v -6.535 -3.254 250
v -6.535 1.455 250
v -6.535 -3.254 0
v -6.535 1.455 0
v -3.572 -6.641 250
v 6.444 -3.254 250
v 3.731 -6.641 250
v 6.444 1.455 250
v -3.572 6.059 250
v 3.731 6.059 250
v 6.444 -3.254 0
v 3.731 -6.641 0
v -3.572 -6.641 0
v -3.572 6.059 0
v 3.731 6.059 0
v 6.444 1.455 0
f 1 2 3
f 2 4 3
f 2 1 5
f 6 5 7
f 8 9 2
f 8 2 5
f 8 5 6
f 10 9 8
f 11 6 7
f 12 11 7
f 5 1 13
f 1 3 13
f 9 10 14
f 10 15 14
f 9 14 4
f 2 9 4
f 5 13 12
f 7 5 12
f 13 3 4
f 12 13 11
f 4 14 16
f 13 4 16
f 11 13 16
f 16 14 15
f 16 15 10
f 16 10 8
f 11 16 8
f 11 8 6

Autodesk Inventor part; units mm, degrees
ref_plane "YZ Plane" through (0, 0, 0) normal (1, 0, 0) x (0, 1, 0)
ref_plane "XZ Plane" through (0, 0, 0) normal (0, 1, 0) x (-1, 0, 0)
ref_plane "XY Plane" through (0, 0, 0) normal (0, 0, 1) x (1, 0, 0)
sketch "Sketch1" plane through (0, 0, 0) normal (0, 0, 1) x (1, 0, 0)
  line L0 (3.7307, 6.0592) -> (-3.572, 6.0592)
  line L1 (-3.572, 6.0592) -> (-6.5354, 1.4553)
  line L2 (-6.5354, 1.4553) -> (-6.5354, -3.2545)
  line L3 (-6.5354, -3.2545) -> (-3.572, -6.6413)
  line L4 (-3.572, -6.6413) -> (3.7307, -6.6413)
  line L5 (3.7307, 6.0592) -> (6.4435, 1.4553)
  line L6 (6.4435, 1.4553) -> (6.4435, -3.2545)
  line L7 (6.4435, -3.2545) -> (3.7307, -6.6413)
  point P0 (0, 0)
extrude "Extrusion1" add sketch "Sketch1" along normal blind 250
sketch "Sketch2" plane through (0, 0, 250) normal (0, 0, 1) x (1, 0, 0)
  point P0 (0, 0)
properties part number "pillar"
